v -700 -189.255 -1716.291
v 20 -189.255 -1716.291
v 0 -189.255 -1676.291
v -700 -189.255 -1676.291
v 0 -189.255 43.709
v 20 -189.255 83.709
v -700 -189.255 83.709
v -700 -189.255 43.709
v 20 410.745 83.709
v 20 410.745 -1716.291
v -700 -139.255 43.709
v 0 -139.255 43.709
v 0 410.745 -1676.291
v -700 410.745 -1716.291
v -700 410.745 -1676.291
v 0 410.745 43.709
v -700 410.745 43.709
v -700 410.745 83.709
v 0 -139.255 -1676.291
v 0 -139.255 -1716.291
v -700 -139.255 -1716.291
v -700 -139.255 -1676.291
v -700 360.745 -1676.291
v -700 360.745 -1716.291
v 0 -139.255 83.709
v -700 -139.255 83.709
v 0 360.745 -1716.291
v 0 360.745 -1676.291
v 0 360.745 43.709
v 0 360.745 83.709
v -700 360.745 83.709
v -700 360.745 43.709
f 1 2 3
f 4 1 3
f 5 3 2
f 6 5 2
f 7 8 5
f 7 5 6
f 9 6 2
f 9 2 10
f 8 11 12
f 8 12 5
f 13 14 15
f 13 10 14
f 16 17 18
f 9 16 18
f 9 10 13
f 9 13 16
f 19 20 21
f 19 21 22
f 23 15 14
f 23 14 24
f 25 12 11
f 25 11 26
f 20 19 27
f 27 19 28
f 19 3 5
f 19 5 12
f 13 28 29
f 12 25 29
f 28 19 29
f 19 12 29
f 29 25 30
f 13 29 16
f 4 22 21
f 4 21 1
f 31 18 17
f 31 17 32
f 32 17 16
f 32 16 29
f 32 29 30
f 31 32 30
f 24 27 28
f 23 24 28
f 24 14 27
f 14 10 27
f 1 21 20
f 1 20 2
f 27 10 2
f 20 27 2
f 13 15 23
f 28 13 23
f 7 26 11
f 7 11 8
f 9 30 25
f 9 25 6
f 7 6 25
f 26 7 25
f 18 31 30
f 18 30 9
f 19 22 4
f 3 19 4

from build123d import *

# Parameters (mm, degrees)
SKETCH_1_W      = 600
SKETCH_1_H      = 1800
EXTRUDE_1_DEPTH = 20
SKETCH_2_W      = 50
SKETCH_2_H      = 40
EXTRUDE_2_DEPTH = 700


with BuildPart() as part:
    # 스케치1 → 보스-돌출1 (new body)
    with BuildSketch(Plane.YZ):
        with Locations((110.745233969, -816.291161179)):
            Rectangle(SKETCH_1_W, SKETCH_1_H)
    extrude(amount=EXTRUDE_1_DEPTH)

    # 스케치2 → 보스-돌출2 (add)
    with BuildSketch(Plane(origin=(0, 0, 0), x_dir=(0, -1, 0), z_dir=(-1, 0, 0))):
        with Locations((-385.745233969, -1696.291161179)):
            Rectangle(SKETCH_2_W, SKETCH_2_H)
        with Locations((-385.745233969, 63.708838821)):
            Rectangle(SKETCH_2_W, SKETCH_2_H)
        with Locations((164.254766031, 63.708838821)):
            Rectangle(SKETCH_2_W, SKETCH_2_H)
        with Locations((164.254766031, -1696.291161179)):
            Rectangle(SKETCH_2_W, SKETCH_2_H)
    extrude(amount=EXTRUDE_2_DEPTH)


solid = part.part
